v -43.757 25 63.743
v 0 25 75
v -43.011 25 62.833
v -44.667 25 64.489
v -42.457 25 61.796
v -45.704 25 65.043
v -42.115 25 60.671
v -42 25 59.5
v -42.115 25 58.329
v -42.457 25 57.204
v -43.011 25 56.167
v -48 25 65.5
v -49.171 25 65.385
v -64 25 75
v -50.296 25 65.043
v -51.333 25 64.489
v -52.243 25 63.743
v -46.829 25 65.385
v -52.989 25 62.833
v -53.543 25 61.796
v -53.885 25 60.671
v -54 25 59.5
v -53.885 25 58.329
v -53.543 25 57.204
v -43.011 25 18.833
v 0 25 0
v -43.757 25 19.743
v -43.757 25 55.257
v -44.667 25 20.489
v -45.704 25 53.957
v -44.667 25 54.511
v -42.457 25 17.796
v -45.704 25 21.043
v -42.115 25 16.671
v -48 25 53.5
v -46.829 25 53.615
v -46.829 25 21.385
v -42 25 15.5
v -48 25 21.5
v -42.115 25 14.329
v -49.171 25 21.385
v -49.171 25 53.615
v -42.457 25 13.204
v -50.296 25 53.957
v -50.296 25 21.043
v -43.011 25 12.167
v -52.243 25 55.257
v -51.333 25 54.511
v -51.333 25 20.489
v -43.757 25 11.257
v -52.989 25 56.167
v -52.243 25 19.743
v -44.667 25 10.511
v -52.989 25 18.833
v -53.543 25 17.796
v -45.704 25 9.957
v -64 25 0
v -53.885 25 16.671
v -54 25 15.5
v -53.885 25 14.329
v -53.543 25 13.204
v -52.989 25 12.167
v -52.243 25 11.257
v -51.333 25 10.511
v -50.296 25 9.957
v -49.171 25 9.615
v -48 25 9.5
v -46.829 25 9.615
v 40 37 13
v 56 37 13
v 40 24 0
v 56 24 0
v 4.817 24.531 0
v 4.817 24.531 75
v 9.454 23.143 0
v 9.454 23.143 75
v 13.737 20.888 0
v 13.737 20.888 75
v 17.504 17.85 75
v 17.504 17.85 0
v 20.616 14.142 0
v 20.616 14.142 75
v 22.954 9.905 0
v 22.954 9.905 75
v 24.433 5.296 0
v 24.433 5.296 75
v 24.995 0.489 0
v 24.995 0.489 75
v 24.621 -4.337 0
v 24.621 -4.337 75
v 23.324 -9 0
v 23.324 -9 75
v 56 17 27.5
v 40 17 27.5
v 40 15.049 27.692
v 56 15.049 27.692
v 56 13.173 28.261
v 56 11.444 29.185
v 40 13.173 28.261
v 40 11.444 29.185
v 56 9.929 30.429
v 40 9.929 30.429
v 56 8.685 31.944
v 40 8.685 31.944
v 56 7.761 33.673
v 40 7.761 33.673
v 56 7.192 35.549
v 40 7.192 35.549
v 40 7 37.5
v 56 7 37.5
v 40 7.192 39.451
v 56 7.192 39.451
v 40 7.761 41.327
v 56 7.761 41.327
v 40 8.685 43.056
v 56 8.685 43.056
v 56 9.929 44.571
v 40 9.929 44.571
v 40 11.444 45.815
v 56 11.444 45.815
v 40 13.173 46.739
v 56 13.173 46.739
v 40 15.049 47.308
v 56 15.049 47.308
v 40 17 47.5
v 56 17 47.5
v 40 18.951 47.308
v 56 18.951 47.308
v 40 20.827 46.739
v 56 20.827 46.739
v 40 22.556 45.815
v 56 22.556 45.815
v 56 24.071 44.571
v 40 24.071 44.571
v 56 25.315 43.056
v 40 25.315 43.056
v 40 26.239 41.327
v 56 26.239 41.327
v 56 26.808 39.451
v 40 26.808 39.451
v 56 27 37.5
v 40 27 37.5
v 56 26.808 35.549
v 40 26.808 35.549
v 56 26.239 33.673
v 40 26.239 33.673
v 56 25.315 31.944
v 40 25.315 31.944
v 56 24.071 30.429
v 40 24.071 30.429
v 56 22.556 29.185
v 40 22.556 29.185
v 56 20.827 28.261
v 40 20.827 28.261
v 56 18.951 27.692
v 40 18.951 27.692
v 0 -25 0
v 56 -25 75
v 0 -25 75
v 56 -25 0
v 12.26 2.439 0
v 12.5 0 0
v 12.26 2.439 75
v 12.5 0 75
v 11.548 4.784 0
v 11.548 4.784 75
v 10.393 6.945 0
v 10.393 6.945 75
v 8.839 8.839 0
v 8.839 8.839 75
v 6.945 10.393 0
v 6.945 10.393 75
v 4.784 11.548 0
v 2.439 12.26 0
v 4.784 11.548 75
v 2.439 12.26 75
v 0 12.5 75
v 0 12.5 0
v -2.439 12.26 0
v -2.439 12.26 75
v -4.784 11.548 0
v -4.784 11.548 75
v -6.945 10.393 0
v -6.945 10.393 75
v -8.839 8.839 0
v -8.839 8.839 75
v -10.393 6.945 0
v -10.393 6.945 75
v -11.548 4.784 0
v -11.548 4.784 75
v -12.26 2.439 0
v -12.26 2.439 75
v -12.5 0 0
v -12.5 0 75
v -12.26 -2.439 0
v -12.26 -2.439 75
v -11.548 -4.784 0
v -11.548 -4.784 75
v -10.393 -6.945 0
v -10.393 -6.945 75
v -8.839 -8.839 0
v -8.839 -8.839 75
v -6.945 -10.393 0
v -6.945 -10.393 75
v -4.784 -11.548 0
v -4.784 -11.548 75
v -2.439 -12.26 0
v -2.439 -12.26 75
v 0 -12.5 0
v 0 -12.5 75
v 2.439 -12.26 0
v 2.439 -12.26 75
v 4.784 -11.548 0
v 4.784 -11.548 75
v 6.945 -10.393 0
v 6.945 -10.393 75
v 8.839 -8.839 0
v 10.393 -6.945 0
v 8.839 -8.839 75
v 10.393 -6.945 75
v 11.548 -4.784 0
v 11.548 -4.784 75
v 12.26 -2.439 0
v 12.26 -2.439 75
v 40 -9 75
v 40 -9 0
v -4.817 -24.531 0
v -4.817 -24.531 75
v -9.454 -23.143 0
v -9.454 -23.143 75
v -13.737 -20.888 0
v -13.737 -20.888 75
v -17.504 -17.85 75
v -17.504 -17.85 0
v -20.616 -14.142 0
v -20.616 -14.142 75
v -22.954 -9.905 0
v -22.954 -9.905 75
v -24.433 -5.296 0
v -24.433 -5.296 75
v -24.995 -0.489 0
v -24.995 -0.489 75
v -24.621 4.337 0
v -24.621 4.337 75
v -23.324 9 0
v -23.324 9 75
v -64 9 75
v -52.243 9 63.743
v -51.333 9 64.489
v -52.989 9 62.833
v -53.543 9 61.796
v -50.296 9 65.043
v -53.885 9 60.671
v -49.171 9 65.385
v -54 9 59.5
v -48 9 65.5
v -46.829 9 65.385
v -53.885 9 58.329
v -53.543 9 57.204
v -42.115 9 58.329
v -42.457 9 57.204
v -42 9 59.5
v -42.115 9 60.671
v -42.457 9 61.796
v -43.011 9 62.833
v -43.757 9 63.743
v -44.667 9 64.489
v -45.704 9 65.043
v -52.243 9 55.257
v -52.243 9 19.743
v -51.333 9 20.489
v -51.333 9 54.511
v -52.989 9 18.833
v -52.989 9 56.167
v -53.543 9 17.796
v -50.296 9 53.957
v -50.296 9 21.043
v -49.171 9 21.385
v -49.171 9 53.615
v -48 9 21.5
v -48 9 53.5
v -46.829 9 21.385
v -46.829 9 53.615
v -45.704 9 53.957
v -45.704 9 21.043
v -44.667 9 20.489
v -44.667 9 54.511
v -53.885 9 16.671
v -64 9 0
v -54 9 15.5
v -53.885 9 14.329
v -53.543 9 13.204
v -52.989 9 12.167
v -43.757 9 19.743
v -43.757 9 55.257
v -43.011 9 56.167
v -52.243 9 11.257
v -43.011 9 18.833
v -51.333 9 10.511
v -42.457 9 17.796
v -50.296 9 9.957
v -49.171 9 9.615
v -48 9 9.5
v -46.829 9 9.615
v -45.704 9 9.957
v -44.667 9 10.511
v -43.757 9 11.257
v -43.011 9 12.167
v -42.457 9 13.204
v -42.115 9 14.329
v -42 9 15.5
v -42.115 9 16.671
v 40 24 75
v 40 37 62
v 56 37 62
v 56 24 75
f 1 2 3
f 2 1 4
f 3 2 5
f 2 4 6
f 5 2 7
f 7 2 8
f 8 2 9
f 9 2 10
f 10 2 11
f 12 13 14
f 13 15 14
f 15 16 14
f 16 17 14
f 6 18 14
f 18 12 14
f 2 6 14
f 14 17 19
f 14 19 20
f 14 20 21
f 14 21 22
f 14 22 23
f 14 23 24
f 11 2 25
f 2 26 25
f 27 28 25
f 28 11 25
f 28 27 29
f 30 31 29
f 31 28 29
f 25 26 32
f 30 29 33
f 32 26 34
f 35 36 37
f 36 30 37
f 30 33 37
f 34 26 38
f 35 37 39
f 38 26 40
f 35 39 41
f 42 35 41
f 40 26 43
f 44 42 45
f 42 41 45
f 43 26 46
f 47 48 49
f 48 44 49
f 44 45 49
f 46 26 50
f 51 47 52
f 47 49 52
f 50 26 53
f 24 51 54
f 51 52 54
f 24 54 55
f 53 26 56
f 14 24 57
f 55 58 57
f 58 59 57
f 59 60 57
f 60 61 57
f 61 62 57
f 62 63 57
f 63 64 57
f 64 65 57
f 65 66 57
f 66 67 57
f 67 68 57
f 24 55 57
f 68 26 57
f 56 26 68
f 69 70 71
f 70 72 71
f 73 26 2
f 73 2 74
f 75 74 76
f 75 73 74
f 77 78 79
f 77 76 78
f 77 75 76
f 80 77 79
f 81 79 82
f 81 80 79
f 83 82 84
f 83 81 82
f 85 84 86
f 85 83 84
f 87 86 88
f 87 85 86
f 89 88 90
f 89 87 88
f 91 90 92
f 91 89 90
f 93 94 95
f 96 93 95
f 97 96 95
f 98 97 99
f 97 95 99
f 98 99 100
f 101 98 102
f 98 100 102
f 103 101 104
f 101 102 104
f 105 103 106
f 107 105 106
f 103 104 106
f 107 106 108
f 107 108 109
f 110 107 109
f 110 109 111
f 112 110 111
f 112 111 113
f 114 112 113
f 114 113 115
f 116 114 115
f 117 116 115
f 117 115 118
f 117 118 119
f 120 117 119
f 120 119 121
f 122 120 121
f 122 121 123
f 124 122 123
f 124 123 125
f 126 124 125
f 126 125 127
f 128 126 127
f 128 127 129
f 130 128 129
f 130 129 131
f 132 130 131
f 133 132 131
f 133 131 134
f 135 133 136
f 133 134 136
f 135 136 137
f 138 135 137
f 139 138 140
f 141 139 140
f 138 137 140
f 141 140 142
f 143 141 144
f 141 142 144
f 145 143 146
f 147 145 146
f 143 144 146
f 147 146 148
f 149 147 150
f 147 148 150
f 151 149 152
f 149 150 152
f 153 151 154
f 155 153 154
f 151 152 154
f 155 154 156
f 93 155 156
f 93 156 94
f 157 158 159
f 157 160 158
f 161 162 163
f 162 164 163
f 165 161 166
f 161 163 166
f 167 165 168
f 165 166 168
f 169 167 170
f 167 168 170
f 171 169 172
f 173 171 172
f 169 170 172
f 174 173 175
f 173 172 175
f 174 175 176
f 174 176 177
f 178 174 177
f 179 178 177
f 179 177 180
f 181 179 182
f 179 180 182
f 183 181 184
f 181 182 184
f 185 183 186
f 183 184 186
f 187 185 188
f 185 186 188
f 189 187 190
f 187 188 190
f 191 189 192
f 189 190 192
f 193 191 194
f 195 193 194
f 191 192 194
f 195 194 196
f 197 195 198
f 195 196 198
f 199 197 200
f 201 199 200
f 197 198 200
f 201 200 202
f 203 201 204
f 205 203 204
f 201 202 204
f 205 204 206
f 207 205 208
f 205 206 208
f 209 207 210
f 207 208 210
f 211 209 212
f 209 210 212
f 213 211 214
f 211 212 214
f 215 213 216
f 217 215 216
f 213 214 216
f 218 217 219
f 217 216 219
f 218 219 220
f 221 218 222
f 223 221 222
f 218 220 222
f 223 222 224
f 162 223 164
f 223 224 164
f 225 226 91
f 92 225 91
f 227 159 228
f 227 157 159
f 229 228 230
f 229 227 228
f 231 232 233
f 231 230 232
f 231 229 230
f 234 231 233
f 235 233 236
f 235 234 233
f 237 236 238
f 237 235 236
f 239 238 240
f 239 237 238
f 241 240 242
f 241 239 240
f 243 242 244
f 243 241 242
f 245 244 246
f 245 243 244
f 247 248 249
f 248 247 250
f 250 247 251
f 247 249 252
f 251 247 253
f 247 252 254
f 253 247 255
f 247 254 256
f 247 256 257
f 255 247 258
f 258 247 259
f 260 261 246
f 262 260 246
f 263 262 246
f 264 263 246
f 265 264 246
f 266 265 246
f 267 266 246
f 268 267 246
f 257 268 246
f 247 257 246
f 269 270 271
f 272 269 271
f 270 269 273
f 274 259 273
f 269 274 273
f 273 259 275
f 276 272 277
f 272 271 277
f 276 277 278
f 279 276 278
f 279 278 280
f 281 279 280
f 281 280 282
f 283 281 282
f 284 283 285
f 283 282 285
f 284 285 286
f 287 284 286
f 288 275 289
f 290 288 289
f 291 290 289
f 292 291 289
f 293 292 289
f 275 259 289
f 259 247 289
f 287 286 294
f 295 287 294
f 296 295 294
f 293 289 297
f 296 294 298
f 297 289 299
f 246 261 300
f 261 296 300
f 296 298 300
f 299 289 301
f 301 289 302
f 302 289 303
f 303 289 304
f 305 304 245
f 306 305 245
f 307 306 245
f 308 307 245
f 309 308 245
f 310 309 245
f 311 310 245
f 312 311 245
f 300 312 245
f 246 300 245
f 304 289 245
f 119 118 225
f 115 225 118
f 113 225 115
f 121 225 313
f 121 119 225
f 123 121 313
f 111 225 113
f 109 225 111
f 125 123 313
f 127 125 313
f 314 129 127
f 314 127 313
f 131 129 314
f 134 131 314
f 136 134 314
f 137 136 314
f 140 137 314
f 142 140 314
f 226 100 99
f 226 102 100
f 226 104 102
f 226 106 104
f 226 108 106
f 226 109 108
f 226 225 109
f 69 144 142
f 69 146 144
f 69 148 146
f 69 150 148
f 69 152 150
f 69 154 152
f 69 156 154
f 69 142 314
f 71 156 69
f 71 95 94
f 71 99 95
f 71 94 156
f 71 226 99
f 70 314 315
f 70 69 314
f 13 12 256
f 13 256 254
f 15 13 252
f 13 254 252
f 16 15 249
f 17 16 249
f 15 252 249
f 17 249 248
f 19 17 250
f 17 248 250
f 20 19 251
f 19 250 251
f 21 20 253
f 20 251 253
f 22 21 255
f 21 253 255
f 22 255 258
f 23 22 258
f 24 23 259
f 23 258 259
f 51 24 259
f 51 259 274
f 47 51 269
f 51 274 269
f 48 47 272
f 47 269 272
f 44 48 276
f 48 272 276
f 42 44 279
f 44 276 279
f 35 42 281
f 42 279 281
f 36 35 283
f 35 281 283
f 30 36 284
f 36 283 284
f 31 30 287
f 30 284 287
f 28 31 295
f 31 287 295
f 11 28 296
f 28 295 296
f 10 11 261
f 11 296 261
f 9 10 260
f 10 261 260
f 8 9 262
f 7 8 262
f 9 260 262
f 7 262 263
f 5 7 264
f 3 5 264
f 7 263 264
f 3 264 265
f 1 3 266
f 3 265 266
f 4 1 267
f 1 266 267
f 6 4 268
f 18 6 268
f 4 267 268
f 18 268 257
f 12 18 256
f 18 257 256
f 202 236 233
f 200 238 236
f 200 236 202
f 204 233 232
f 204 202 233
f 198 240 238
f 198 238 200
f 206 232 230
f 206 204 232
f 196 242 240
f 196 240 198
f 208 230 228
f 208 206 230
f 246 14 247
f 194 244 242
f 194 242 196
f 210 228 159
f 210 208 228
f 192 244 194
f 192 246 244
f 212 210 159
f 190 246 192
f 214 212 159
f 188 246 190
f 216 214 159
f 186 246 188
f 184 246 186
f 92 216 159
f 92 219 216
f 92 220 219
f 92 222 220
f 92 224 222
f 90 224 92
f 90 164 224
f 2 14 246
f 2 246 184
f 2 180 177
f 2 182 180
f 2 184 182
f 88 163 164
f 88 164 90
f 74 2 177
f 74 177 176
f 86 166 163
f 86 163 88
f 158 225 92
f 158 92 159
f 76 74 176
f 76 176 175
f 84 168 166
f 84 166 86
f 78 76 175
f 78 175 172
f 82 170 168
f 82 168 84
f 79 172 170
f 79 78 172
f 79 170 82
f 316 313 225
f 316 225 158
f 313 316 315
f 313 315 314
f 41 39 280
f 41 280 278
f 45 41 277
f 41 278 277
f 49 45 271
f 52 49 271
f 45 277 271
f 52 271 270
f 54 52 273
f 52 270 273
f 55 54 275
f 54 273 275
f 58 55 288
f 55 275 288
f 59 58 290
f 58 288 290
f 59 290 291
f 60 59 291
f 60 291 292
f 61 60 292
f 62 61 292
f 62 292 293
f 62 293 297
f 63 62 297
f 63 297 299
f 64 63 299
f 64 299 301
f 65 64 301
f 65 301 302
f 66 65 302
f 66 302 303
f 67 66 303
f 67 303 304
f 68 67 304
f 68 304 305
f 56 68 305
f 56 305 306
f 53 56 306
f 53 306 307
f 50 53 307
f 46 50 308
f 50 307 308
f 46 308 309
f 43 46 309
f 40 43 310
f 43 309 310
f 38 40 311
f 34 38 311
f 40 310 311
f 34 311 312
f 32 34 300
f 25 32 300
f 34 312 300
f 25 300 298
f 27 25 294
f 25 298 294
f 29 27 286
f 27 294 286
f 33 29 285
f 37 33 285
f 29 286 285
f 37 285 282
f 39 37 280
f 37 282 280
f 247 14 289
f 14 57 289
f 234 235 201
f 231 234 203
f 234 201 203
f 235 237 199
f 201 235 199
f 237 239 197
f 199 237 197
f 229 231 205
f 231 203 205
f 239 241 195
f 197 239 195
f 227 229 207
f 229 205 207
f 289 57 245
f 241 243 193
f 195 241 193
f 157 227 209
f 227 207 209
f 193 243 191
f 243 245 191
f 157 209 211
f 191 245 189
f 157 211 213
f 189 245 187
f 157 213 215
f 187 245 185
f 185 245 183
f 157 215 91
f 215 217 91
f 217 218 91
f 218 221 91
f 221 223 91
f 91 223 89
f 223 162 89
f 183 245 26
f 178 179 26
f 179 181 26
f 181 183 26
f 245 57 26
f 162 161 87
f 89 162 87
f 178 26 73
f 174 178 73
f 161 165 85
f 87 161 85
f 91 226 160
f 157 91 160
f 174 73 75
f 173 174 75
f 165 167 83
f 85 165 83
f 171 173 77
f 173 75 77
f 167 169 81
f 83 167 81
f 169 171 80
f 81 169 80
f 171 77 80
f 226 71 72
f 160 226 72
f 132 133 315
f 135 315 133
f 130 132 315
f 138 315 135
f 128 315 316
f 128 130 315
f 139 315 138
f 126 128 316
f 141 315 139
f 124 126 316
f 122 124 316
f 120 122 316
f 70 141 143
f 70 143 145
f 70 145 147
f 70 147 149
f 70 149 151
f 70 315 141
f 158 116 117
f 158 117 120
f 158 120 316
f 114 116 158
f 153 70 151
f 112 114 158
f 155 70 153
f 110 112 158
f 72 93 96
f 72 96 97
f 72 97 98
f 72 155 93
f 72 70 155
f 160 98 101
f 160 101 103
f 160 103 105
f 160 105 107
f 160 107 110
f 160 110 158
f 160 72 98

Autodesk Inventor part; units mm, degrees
ref_plane "YZ Plane" through (0, 0, 0) normal (1, 0, 0) x (0, 1, 0)
ref_plane "XZ Plane" through (0, 0, 0) normal (0, 1, 0) x (-1, 0, 0)
ref_plane "XY Plane" through (0, 0, 0) normal (0, 0, 1) x (1, 0, 0)
sketch "Skizze1" plane through (0, 0, 0) normal (0, 0, 1) x (1, 0, 0)
  line L0 (40, 37) -> (56, 37)
  line L1 (56, 37) -> (56, -25)
  line L2 (40, -9) -> (40, 37)
  line L3 (56, -25) -> (0, -25)
  line L4 (40, -9) -> (23.3238, -9)
  line L5 (0, 25) -> (-64, 25)
  line L6 (-64, 25) -> (-64, 9)
  line L7 (-64, 9) -> (-23.3238, 9)
  arc A0 (23.3238, -9) -> (0, 25) centre (0, 0) ccw
  arc A1 (-23.3238, 9) -> (0, -25) centre (0, 0) ccw
  dimension "d0" = 16
  dimension "d1" = 25
  dimension "d2" = 62
  dimension "d3" = 56
  dimension "d4" = 16
  dimension "d5" = 120
  dimension "d6" = 16
  dimension "d7" = 25
extrude "Extrusion1" add sketch "Skizze1" along normal blind 75
sketch "Skizze2" plane through (0, 0, 75) normal (0, 0, 1) x (1, 0, 0)
  circle A0 centre (0, 0) radius 12.5
  dimension "d10" = 25
extrude "Extrusion2" cut sketch "Skizze2" against normal up to surface (75 mm away)
chamfer "Fasen1" distance 13 angle 45 2 edges at (48, 37, 75) (48, 37, 0)
sketch "Skizze3" plane through (56, -25, 75) normal (1, 0, 0) x (0, 0, -1)
  line L0 (62, 62) -> (13, 62) projected
  point P0 (75, 25)
  point P1 (37.5, 42)
  point P2 (37.5, 62)
  dimension "d23" = 20
hole "Bohrung1" at (56, 17, 37.5) direction (-1, 0, 0) diameter 20 depth 16
sketch "Skizze4" plane through (-64, 25, 0) normal (0, 1, 0) x (1, 0, 0)
  line L0 (0, 0) -> (0, -75) projected
  line L1 (0, -37.5) -> (64, -37.5) construction
  line L2 (64, 0) -> (64, -75) projected
  point P0 (16, -59.5)
  point P1 (16, -15.5)
  dimension "d31" = 44
  dimension "d32" = 16
hole "Bohrung2" at (-48, 25, 59.5) at (-48, 25, 15.5) direction (0, -1, 0) diameter 12 end through all
equation "\"d0\" = d4"
equation "\"d6\" = d0"
properties part number "practice4" material "Stahl, galvanisiert"
